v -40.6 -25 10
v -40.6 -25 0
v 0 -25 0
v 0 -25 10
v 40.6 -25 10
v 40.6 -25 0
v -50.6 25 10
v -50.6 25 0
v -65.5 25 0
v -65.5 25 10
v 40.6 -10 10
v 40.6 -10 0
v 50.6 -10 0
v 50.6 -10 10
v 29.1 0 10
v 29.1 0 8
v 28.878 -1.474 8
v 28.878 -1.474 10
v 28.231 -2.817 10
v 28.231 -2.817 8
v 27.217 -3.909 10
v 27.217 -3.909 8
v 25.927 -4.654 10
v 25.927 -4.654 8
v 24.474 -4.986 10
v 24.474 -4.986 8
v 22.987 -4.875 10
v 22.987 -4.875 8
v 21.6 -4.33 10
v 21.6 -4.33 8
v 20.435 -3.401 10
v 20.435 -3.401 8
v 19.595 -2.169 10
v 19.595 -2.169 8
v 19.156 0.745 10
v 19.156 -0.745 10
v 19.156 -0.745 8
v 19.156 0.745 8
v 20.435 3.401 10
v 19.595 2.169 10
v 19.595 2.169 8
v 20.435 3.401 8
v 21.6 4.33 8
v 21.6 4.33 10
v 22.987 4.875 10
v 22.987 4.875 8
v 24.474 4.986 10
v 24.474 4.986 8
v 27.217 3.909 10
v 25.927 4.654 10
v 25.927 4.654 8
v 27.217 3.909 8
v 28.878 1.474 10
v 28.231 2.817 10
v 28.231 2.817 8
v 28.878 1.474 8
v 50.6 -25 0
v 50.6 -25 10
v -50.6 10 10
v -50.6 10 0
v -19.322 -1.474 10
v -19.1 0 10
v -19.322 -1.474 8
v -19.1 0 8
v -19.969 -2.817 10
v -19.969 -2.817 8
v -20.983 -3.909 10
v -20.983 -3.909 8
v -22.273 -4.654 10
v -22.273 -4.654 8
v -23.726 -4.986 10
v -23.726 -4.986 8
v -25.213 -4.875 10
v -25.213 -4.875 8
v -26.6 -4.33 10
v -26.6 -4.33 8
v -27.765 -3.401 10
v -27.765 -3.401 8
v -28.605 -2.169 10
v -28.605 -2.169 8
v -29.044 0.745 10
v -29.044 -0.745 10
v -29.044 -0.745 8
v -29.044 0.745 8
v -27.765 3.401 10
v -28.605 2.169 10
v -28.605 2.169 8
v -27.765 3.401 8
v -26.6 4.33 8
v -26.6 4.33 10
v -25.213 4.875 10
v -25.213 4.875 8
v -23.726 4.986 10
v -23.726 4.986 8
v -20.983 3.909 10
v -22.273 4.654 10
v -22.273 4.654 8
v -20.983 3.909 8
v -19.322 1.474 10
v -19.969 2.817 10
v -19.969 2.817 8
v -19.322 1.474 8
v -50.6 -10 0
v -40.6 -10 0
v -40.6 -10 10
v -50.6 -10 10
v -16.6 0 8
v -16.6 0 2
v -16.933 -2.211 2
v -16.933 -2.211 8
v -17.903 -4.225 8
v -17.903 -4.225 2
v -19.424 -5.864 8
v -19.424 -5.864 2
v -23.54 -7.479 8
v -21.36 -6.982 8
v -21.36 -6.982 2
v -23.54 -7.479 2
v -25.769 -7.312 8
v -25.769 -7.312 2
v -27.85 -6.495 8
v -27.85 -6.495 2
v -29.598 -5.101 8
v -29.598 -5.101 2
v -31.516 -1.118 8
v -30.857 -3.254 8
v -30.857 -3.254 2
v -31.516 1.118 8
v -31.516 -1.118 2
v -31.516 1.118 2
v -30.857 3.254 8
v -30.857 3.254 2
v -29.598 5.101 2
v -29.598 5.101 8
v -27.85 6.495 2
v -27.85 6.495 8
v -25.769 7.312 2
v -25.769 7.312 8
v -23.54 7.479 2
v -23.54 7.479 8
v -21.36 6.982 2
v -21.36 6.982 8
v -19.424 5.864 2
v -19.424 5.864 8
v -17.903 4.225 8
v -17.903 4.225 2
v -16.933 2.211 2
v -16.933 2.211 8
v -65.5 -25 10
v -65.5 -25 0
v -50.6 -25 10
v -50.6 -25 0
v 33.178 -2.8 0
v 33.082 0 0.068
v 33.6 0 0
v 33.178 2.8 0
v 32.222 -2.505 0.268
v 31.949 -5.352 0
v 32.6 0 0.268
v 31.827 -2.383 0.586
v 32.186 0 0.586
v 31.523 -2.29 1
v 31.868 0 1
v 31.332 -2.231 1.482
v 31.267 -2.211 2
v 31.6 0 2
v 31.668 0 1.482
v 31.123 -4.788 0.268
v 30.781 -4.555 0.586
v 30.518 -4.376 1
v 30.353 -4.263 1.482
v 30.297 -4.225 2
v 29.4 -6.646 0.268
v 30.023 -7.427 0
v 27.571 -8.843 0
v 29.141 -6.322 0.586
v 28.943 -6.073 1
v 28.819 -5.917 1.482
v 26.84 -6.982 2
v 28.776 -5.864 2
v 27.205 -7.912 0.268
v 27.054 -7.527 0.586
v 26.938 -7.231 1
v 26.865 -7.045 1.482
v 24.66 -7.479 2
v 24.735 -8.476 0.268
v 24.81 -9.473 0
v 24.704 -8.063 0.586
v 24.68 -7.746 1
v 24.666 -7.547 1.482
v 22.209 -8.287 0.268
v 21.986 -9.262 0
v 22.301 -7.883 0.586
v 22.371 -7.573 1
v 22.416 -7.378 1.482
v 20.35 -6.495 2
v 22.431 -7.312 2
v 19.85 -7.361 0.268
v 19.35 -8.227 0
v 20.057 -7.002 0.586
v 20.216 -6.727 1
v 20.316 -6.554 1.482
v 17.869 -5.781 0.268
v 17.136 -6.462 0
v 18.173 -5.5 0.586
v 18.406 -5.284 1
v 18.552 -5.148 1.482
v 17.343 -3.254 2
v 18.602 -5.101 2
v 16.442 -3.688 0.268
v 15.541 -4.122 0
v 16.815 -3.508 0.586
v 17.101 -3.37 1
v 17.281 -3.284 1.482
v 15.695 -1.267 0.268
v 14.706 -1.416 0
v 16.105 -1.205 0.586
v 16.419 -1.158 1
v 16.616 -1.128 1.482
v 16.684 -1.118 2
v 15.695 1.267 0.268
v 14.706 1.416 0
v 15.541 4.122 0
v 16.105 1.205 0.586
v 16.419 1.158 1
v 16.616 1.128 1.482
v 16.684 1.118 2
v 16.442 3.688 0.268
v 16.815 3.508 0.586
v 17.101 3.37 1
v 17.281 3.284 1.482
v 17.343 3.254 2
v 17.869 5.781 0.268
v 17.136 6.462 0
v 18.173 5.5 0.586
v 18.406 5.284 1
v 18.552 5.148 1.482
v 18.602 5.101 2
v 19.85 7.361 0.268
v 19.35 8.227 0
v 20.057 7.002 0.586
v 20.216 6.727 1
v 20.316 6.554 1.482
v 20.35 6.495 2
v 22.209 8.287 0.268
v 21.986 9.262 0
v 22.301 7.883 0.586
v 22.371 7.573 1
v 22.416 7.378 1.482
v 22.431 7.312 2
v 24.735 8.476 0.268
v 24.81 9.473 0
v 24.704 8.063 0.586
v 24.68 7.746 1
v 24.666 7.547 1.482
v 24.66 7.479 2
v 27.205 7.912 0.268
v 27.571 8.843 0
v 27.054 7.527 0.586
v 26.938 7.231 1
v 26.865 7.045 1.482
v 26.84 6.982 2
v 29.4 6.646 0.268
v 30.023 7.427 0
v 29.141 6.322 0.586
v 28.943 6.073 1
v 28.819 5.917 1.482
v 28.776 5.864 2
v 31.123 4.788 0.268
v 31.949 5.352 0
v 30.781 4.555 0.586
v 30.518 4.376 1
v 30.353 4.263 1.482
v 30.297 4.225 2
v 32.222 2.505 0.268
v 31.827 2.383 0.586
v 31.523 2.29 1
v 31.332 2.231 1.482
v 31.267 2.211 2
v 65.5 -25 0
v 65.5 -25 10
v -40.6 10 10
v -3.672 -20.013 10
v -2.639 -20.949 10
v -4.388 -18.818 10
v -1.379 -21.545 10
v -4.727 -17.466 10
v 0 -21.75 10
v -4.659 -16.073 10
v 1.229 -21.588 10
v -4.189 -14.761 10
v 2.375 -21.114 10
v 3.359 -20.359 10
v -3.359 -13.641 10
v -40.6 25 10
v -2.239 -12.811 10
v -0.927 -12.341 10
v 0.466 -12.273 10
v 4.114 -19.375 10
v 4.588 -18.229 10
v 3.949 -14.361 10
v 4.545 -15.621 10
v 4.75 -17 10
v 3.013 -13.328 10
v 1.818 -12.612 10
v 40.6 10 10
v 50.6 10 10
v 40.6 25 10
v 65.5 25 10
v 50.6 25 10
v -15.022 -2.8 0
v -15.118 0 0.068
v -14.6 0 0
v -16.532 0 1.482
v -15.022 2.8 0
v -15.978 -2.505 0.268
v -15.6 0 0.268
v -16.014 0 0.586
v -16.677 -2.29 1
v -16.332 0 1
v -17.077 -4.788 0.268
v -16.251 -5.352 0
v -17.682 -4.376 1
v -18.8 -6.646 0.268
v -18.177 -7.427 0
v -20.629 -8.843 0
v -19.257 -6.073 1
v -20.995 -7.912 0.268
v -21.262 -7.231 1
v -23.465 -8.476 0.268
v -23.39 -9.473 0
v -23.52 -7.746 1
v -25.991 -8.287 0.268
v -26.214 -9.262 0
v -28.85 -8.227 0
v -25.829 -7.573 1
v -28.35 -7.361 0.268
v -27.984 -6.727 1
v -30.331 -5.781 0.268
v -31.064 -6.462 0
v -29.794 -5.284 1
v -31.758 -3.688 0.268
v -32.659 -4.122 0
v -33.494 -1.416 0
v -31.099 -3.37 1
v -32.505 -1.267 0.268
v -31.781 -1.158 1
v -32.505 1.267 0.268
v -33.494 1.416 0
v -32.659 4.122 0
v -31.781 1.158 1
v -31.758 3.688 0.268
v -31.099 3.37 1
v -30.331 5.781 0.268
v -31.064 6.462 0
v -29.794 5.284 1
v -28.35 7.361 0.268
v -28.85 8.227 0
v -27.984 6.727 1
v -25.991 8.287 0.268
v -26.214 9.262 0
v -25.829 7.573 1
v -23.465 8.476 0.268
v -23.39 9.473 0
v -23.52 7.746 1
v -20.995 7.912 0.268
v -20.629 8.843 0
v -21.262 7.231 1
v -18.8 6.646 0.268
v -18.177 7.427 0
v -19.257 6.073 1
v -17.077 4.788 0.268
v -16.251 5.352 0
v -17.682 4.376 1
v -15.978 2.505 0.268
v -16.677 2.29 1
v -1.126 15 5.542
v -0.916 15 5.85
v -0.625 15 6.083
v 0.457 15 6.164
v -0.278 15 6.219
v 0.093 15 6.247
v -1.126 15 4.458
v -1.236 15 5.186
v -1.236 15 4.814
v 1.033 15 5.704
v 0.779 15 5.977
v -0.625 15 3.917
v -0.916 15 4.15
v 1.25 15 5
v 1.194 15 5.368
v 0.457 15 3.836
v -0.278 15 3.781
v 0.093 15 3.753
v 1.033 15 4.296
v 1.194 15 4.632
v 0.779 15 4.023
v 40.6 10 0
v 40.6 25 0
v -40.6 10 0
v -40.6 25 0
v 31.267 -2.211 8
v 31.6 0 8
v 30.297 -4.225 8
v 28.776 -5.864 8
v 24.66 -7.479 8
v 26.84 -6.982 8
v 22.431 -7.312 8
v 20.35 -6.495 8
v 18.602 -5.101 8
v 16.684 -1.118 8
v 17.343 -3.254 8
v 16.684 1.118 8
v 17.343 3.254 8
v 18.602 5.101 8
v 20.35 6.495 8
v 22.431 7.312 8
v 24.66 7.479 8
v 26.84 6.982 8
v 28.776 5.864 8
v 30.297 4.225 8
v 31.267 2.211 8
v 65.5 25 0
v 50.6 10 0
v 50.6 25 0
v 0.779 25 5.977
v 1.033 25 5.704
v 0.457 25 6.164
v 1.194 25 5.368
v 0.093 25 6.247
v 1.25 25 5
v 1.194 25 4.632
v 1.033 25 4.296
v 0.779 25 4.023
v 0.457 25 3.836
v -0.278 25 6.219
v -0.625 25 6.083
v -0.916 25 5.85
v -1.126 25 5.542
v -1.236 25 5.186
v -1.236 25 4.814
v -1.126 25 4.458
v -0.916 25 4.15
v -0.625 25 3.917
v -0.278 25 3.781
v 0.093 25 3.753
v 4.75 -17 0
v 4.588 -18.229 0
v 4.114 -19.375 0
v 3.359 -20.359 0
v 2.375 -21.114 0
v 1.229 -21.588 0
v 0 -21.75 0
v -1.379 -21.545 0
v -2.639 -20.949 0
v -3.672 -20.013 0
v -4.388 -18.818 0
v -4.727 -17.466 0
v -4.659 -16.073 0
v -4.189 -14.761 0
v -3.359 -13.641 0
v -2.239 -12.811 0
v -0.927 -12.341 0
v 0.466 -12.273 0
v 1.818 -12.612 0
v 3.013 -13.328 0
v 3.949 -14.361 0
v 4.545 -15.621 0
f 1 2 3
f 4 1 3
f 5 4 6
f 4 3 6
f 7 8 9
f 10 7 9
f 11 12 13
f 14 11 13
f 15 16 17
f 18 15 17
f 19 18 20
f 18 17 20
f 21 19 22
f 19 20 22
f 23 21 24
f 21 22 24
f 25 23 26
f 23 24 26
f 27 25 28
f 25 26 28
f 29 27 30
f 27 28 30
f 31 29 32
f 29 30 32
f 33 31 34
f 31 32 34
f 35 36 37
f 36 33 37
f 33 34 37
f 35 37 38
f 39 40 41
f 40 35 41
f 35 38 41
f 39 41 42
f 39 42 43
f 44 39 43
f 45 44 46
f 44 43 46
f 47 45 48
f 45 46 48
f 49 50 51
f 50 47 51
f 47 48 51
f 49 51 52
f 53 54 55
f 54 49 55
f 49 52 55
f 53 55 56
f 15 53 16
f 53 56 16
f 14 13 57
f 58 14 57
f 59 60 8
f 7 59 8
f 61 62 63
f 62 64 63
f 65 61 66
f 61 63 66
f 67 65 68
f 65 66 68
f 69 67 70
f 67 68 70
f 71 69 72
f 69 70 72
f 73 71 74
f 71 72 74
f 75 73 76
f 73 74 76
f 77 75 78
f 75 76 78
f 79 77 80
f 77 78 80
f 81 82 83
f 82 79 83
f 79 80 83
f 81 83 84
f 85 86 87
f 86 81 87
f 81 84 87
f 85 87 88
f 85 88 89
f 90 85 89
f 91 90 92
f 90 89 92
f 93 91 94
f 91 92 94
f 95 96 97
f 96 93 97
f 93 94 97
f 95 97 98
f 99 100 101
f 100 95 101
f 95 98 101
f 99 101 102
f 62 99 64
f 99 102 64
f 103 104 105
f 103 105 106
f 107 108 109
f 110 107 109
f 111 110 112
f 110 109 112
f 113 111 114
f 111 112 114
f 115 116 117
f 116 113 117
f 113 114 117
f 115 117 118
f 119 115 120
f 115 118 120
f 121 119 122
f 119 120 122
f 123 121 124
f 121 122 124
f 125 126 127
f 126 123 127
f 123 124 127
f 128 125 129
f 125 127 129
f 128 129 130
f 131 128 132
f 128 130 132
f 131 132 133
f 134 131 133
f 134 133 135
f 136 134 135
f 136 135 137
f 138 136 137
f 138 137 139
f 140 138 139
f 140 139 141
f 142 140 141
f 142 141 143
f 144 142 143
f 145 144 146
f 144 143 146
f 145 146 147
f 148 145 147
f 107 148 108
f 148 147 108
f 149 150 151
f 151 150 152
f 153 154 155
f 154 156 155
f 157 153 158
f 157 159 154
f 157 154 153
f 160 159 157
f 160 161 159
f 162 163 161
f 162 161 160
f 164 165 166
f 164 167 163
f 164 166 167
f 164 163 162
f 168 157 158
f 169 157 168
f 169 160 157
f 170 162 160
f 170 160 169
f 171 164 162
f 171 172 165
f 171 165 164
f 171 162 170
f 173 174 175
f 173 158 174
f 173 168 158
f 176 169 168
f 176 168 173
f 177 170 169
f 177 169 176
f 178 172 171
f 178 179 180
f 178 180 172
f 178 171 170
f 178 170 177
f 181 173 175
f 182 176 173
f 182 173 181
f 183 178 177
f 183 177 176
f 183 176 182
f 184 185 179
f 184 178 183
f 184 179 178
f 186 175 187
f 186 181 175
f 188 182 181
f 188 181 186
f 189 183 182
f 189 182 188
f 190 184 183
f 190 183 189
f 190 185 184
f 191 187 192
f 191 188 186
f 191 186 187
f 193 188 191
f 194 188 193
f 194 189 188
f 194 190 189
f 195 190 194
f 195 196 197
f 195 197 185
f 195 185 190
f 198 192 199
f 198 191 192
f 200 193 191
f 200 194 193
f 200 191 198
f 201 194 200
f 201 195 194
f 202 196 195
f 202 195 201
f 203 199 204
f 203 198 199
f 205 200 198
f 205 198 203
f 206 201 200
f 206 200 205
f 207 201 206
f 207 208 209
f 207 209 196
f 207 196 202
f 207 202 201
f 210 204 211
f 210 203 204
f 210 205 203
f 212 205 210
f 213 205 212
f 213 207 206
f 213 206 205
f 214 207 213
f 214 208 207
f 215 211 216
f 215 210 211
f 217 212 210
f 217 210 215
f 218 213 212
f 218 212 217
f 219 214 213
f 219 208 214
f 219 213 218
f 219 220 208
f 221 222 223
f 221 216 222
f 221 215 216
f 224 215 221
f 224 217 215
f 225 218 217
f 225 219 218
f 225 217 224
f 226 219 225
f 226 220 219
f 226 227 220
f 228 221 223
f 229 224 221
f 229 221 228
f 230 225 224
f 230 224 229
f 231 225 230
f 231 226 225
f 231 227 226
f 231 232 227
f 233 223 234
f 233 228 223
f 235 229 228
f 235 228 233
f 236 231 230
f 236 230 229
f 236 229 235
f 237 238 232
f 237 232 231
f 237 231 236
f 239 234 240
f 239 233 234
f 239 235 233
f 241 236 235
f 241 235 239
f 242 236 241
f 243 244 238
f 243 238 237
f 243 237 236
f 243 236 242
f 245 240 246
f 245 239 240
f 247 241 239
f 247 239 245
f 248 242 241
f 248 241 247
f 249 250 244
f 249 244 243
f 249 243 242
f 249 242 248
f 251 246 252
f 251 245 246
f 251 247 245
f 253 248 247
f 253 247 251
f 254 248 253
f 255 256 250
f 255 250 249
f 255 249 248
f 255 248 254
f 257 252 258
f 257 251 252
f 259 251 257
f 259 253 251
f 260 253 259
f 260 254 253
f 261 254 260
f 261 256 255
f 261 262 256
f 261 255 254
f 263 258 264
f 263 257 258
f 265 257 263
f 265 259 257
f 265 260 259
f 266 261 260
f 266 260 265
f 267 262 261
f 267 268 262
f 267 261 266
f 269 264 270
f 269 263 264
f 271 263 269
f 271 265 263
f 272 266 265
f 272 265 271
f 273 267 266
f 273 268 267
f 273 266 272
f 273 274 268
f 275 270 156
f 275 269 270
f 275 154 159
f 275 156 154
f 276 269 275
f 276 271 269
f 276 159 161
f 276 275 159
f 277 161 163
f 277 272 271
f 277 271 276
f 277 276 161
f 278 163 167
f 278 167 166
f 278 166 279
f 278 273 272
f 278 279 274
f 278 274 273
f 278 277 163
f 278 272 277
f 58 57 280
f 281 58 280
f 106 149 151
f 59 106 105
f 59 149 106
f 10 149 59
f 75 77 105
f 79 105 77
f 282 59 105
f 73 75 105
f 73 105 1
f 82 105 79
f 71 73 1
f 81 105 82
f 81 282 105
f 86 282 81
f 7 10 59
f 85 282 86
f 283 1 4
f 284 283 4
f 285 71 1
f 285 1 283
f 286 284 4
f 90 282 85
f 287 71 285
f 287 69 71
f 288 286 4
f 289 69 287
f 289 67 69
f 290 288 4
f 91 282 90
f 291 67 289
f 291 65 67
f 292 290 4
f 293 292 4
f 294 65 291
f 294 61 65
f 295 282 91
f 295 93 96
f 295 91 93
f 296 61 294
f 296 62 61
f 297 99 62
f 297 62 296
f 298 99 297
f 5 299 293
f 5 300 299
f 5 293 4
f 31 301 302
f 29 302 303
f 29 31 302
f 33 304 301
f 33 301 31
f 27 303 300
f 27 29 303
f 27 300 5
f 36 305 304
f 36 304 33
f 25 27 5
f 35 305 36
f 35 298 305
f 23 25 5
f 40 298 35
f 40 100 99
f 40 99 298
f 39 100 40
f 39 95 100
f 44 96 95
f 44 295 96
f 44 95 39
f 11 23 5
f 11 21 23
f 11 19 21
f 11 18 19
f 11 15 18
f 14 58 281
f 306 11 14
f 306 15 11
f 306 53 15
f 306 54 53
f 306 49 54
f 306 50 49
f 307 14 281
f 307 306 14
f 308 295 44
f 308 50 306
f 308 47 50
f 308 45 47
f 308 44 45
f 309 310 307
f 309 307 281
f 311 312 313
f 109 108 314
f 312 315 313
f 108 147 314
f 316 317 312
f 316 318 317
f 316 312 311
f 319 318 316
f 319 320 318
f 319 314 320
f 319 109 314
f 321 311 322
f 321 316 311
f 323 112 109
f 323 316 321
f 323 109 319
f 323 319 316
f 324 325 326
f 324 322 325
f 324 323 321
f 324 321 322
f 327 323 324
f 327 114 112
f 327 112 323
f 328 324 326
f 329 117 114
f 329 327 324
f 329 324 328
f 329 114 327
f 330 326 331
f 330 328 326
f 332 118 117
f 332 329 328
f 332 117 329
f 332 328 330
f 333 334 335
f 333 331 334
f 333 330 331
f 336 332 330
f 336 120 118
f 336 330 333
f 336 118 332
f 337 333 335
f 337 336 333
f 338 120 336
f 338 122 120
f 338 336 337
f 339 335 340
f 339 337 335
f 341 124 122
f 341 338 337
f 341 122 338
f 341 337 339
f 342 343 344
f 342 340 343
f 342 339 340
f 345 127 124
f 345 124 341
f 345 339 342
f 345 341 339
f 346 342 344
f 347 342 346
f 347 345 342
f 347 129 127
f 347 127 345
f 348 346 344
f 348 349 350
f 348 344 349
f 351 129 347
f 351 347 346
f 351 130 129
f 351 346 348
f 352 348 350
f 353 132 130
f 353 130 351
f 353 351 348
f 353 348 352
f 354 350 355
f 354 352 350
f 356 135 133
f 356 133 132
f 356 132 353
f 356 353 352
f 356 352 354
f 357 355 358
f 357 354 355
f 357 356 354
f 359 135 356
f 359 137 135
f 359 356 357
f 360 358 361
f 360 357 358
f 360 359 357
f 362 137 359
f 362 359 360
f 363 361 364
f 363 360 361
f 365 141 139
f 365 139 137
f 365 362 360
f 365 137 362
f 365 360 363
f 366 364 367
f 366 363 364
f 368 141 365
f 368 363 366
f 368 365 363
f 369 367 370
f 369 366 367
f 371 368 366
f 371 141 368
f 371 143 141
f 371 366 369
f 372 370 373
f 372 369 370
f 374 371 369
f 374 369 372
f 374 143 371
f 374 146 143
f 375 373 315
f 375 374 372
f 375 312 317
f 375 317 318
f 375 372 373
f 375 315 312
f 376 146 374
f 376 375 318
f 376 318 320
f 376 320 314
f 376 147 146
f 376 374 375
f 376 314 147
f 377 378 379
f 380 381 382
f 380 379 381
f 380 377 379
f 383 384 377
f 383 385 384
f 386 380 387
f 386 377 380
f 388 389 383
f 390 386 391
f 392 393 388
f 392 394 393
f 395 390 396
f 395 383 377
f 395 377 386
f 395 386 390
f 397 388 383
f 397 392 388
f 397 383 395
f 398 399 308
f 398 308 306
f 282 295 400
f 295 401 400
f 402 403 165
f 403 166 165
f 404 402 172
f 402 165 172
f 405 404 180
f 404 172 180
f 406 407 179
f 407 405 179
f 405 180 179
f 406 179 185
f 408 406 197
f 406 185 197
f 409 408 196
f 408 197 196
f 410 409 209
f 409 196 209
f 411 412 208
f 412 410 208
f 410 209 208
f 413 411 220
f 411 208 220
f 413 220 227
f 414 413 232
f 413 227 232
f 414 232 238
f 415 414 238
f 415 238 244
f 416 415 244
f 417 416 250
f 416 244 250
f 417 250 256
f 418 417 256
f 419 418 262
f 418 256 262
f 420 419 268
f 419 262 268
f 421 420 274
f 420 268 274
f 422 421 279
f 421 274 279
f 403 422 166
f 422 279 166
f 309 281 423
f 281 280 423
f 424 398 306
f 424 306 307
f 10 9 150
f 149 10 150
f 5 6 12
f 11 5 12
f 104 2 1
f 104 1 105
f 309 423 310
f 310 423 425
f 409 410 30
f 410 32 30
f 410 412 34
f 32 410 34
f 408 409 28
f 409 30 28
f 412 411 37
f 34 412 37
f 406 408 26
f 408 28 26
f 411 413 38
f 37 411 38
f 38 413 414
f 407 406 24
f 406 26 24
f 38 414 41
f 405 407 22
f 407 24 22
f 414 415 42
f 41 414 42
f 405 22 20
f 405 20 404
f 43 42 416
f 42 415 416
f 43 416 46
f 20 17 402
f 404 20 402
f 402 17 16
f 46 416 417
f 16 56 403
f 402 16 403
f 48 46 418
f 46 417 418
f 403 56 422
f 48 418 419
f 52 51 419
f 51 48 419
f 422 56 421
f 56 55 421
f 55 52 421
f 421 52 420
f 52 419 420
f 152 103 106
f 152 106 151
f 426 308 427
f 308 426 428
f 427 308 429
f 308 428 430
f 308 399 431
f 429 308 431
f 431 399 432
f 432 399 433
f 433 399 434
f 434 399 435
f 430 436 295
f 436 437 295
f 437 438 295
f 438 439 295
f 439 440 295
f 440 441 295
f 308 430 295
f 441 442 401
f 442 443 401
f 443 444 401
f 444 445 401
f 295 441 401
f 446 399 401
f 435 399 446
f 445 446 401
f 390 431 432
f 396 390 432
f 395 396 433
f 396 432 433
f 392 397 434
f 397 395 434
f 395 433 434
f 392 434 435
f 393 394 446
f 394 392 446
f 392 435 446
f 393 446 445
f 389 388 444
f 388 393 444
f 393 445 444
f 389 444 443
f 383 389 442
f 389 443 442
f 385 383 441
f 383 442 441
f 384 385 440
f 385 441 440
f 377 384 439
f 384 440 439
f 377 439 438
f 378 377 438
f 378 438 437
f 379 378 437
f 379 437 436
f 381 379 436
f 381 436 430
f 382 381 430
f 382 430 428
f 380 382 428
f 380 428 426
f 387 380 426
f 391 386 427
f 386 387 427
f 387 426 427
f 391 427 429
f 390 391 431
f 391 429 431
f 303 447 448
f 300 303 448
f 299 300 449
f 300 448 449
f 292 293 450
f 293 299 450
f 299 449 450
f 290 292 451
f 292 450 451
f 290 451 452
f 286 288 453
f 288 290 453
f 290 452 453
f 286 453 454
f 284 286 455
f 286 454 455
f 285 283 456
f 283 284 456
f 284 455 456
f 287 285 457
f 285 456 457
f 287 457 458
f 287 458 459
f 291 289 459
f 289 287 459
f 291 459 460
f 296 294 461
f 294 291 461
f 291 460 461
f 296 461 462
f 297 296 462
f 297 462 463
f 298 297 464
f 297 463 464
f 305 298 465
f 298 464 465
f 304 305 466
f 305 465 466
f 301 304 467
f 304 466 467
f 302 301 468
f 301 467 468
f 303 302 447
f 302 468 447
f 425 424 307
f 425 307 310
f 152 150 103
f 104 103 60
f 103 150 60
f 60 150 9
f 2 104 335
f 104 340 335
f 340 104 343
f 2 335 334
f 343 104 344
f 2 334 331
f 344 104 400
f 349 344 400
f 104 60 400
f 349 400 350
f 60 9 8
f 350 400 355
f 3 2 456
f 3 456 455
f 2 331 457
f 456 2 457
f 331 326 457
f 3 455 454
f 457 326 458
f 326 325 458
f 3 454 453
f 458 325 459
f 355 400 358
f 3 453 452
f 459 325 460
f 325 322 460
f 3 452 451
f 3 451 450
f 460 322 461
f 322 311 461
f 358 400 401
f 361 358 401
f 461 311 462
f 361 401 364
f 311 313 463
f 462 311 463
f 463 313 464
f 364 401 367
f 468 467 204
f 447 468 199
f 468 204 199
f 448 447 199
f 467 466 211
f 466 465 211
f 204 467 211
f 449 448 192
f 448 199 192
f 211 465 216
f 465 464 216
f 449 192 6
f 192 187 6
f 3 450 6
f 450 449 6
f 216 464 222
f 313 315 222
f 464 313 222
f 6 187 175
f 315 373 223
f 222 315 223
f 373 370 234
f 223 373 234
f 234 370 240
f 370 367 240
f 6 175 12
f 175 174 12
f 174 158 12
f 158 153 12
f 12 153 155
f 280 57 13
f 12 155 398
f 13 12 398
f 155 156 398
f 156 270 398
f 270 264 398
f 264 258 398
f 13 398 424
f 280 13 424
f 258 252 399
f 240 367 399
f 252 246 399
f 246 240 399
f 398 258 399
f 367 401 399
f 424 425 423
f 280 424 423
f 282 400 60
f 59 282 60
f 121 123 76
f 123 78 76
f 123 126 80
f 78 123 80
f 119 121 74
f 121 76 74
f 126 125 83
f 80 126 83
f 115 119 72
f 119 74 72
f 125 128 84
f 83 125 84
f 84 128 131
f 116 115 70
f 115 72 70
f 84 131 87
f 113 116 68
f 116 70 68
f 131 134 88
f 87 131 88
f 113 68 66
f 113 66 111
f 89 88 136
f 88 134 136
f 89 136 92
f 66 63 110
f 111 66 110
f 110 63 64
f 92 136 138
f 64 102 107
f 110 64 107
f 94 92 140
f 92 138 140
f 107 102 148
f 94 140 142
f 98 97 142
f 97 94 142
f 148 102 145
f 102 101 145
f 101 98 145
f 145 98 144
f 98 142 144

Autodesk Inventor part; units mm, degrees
ref_plane "YZ Plane" through (0, 0, 0) normal (1, 0, 0) x (0, 1, 0)
ref_plane "XZ Plane" through (0, 0, 0) normal (0, 1, 0) x (-1, 0, 0)
sketch "Sketch1" plane through (0, 0, 0) normal (0, 0, 1) x (1, 0, 0)
  line L0 (65.5, 25) -> (-65.5, 25)
  line L1 (-65.5, 25) -> (-65.5, -25)
  line L2 (-65.5, -25) -> (65.5, -25)
  line L3 (65.5, -25) -> (65.5, 25)
  line L4 (-40.6, 25) -> (-40.6, 10)
  line L5 (-40.6, 10) -> (-50.6, 10)
  line L6 (-50.6, 10) -> (-50.6, 25)
  line L7 (-40.6, -25) -> (-40.6, -10)
  line L8 (-40.6, -10) -> (-50.6, -10)
  line L9 (-50.6, -10) -> (-50.6, -25)
  line L10 (40.6, 25) -> (40.6, 10)
  line L11 (40.6, 10) -> (50.6, 10)
  line L12 (50.6, 10) -> (50.6, 25)
  line L13 (40.6, -25) -> (40.6, -10)
  line L14 (40.6, -10) -> (50.6, -10)
  line L15 (50.6, -10) -> (50.6, -25)
  circle A0 centre (24.1, 0) radius 7.5
  circle A1 centre (-24.1, 0) radius 7.5
  line L16 (0, -25) -> (0, -17)
  circle A2 centre (0, -17) radius 4.75
  circle A3 centre (-24.1, 0) radius 5
  circle A4 centre (24.1, 0) radius 5
  point P0 (0, 0)
  point P1 (0, 0)
  dimension "d0" = 15
  dimension "d1" = 15
  dimension "d2" = 15
  dimension "d3" = 15
  dimension "d8" = 15
  dimension "d9" = 15
  dimension "d23" = 8
  dimension "d24" = 9.5
  dimension "d27" = 10
  dimension "d28" = 10
ref_plane "Work Plane1" through (-40.6, 25, 0) normal (0, 1, 0) x (1, 0, 0)
sketch "Sketch2" plane through (-40.6, 25, 0) normal (0, 1, 0) x (1, 0, 0)
  circle A0 centre (40.6, -5) radius 1.25
  point P0 (40.6, 0)
  dimension "d20" = 2.5
extrude "Extrusion11" add sketch "Sketch1" along normal blind 10 contours L3 L2 L15 L14 L13 L7 L8 L9 L1 L0 L6 L5 L4 L10 L11 L12 | A0 | A1
extrude "Extrusion12" cut sketch "Sketch1" along normal blind 8 contours A0 | A1
sketch "Sketch4" plane through (-40.6, 25, 0) normal (0, 1, 0) x (1, 0, 0)
  line L0 (40.6, 0) -> (40.6, -5)
  circle A0 centre (40.6, -5) radius 1.25
  dimension "d50" = 5
  dimension "d51" = 2.5
extrude "Extrusion14" cut sketch "Sketch4" against normal blind 10
fillet "Fillet1" radius 2 2 edges at (-31.6, 0, 0) (16.6, 0, 0)
properties part number "prepazka_2x_lozisko_1x_dira"
